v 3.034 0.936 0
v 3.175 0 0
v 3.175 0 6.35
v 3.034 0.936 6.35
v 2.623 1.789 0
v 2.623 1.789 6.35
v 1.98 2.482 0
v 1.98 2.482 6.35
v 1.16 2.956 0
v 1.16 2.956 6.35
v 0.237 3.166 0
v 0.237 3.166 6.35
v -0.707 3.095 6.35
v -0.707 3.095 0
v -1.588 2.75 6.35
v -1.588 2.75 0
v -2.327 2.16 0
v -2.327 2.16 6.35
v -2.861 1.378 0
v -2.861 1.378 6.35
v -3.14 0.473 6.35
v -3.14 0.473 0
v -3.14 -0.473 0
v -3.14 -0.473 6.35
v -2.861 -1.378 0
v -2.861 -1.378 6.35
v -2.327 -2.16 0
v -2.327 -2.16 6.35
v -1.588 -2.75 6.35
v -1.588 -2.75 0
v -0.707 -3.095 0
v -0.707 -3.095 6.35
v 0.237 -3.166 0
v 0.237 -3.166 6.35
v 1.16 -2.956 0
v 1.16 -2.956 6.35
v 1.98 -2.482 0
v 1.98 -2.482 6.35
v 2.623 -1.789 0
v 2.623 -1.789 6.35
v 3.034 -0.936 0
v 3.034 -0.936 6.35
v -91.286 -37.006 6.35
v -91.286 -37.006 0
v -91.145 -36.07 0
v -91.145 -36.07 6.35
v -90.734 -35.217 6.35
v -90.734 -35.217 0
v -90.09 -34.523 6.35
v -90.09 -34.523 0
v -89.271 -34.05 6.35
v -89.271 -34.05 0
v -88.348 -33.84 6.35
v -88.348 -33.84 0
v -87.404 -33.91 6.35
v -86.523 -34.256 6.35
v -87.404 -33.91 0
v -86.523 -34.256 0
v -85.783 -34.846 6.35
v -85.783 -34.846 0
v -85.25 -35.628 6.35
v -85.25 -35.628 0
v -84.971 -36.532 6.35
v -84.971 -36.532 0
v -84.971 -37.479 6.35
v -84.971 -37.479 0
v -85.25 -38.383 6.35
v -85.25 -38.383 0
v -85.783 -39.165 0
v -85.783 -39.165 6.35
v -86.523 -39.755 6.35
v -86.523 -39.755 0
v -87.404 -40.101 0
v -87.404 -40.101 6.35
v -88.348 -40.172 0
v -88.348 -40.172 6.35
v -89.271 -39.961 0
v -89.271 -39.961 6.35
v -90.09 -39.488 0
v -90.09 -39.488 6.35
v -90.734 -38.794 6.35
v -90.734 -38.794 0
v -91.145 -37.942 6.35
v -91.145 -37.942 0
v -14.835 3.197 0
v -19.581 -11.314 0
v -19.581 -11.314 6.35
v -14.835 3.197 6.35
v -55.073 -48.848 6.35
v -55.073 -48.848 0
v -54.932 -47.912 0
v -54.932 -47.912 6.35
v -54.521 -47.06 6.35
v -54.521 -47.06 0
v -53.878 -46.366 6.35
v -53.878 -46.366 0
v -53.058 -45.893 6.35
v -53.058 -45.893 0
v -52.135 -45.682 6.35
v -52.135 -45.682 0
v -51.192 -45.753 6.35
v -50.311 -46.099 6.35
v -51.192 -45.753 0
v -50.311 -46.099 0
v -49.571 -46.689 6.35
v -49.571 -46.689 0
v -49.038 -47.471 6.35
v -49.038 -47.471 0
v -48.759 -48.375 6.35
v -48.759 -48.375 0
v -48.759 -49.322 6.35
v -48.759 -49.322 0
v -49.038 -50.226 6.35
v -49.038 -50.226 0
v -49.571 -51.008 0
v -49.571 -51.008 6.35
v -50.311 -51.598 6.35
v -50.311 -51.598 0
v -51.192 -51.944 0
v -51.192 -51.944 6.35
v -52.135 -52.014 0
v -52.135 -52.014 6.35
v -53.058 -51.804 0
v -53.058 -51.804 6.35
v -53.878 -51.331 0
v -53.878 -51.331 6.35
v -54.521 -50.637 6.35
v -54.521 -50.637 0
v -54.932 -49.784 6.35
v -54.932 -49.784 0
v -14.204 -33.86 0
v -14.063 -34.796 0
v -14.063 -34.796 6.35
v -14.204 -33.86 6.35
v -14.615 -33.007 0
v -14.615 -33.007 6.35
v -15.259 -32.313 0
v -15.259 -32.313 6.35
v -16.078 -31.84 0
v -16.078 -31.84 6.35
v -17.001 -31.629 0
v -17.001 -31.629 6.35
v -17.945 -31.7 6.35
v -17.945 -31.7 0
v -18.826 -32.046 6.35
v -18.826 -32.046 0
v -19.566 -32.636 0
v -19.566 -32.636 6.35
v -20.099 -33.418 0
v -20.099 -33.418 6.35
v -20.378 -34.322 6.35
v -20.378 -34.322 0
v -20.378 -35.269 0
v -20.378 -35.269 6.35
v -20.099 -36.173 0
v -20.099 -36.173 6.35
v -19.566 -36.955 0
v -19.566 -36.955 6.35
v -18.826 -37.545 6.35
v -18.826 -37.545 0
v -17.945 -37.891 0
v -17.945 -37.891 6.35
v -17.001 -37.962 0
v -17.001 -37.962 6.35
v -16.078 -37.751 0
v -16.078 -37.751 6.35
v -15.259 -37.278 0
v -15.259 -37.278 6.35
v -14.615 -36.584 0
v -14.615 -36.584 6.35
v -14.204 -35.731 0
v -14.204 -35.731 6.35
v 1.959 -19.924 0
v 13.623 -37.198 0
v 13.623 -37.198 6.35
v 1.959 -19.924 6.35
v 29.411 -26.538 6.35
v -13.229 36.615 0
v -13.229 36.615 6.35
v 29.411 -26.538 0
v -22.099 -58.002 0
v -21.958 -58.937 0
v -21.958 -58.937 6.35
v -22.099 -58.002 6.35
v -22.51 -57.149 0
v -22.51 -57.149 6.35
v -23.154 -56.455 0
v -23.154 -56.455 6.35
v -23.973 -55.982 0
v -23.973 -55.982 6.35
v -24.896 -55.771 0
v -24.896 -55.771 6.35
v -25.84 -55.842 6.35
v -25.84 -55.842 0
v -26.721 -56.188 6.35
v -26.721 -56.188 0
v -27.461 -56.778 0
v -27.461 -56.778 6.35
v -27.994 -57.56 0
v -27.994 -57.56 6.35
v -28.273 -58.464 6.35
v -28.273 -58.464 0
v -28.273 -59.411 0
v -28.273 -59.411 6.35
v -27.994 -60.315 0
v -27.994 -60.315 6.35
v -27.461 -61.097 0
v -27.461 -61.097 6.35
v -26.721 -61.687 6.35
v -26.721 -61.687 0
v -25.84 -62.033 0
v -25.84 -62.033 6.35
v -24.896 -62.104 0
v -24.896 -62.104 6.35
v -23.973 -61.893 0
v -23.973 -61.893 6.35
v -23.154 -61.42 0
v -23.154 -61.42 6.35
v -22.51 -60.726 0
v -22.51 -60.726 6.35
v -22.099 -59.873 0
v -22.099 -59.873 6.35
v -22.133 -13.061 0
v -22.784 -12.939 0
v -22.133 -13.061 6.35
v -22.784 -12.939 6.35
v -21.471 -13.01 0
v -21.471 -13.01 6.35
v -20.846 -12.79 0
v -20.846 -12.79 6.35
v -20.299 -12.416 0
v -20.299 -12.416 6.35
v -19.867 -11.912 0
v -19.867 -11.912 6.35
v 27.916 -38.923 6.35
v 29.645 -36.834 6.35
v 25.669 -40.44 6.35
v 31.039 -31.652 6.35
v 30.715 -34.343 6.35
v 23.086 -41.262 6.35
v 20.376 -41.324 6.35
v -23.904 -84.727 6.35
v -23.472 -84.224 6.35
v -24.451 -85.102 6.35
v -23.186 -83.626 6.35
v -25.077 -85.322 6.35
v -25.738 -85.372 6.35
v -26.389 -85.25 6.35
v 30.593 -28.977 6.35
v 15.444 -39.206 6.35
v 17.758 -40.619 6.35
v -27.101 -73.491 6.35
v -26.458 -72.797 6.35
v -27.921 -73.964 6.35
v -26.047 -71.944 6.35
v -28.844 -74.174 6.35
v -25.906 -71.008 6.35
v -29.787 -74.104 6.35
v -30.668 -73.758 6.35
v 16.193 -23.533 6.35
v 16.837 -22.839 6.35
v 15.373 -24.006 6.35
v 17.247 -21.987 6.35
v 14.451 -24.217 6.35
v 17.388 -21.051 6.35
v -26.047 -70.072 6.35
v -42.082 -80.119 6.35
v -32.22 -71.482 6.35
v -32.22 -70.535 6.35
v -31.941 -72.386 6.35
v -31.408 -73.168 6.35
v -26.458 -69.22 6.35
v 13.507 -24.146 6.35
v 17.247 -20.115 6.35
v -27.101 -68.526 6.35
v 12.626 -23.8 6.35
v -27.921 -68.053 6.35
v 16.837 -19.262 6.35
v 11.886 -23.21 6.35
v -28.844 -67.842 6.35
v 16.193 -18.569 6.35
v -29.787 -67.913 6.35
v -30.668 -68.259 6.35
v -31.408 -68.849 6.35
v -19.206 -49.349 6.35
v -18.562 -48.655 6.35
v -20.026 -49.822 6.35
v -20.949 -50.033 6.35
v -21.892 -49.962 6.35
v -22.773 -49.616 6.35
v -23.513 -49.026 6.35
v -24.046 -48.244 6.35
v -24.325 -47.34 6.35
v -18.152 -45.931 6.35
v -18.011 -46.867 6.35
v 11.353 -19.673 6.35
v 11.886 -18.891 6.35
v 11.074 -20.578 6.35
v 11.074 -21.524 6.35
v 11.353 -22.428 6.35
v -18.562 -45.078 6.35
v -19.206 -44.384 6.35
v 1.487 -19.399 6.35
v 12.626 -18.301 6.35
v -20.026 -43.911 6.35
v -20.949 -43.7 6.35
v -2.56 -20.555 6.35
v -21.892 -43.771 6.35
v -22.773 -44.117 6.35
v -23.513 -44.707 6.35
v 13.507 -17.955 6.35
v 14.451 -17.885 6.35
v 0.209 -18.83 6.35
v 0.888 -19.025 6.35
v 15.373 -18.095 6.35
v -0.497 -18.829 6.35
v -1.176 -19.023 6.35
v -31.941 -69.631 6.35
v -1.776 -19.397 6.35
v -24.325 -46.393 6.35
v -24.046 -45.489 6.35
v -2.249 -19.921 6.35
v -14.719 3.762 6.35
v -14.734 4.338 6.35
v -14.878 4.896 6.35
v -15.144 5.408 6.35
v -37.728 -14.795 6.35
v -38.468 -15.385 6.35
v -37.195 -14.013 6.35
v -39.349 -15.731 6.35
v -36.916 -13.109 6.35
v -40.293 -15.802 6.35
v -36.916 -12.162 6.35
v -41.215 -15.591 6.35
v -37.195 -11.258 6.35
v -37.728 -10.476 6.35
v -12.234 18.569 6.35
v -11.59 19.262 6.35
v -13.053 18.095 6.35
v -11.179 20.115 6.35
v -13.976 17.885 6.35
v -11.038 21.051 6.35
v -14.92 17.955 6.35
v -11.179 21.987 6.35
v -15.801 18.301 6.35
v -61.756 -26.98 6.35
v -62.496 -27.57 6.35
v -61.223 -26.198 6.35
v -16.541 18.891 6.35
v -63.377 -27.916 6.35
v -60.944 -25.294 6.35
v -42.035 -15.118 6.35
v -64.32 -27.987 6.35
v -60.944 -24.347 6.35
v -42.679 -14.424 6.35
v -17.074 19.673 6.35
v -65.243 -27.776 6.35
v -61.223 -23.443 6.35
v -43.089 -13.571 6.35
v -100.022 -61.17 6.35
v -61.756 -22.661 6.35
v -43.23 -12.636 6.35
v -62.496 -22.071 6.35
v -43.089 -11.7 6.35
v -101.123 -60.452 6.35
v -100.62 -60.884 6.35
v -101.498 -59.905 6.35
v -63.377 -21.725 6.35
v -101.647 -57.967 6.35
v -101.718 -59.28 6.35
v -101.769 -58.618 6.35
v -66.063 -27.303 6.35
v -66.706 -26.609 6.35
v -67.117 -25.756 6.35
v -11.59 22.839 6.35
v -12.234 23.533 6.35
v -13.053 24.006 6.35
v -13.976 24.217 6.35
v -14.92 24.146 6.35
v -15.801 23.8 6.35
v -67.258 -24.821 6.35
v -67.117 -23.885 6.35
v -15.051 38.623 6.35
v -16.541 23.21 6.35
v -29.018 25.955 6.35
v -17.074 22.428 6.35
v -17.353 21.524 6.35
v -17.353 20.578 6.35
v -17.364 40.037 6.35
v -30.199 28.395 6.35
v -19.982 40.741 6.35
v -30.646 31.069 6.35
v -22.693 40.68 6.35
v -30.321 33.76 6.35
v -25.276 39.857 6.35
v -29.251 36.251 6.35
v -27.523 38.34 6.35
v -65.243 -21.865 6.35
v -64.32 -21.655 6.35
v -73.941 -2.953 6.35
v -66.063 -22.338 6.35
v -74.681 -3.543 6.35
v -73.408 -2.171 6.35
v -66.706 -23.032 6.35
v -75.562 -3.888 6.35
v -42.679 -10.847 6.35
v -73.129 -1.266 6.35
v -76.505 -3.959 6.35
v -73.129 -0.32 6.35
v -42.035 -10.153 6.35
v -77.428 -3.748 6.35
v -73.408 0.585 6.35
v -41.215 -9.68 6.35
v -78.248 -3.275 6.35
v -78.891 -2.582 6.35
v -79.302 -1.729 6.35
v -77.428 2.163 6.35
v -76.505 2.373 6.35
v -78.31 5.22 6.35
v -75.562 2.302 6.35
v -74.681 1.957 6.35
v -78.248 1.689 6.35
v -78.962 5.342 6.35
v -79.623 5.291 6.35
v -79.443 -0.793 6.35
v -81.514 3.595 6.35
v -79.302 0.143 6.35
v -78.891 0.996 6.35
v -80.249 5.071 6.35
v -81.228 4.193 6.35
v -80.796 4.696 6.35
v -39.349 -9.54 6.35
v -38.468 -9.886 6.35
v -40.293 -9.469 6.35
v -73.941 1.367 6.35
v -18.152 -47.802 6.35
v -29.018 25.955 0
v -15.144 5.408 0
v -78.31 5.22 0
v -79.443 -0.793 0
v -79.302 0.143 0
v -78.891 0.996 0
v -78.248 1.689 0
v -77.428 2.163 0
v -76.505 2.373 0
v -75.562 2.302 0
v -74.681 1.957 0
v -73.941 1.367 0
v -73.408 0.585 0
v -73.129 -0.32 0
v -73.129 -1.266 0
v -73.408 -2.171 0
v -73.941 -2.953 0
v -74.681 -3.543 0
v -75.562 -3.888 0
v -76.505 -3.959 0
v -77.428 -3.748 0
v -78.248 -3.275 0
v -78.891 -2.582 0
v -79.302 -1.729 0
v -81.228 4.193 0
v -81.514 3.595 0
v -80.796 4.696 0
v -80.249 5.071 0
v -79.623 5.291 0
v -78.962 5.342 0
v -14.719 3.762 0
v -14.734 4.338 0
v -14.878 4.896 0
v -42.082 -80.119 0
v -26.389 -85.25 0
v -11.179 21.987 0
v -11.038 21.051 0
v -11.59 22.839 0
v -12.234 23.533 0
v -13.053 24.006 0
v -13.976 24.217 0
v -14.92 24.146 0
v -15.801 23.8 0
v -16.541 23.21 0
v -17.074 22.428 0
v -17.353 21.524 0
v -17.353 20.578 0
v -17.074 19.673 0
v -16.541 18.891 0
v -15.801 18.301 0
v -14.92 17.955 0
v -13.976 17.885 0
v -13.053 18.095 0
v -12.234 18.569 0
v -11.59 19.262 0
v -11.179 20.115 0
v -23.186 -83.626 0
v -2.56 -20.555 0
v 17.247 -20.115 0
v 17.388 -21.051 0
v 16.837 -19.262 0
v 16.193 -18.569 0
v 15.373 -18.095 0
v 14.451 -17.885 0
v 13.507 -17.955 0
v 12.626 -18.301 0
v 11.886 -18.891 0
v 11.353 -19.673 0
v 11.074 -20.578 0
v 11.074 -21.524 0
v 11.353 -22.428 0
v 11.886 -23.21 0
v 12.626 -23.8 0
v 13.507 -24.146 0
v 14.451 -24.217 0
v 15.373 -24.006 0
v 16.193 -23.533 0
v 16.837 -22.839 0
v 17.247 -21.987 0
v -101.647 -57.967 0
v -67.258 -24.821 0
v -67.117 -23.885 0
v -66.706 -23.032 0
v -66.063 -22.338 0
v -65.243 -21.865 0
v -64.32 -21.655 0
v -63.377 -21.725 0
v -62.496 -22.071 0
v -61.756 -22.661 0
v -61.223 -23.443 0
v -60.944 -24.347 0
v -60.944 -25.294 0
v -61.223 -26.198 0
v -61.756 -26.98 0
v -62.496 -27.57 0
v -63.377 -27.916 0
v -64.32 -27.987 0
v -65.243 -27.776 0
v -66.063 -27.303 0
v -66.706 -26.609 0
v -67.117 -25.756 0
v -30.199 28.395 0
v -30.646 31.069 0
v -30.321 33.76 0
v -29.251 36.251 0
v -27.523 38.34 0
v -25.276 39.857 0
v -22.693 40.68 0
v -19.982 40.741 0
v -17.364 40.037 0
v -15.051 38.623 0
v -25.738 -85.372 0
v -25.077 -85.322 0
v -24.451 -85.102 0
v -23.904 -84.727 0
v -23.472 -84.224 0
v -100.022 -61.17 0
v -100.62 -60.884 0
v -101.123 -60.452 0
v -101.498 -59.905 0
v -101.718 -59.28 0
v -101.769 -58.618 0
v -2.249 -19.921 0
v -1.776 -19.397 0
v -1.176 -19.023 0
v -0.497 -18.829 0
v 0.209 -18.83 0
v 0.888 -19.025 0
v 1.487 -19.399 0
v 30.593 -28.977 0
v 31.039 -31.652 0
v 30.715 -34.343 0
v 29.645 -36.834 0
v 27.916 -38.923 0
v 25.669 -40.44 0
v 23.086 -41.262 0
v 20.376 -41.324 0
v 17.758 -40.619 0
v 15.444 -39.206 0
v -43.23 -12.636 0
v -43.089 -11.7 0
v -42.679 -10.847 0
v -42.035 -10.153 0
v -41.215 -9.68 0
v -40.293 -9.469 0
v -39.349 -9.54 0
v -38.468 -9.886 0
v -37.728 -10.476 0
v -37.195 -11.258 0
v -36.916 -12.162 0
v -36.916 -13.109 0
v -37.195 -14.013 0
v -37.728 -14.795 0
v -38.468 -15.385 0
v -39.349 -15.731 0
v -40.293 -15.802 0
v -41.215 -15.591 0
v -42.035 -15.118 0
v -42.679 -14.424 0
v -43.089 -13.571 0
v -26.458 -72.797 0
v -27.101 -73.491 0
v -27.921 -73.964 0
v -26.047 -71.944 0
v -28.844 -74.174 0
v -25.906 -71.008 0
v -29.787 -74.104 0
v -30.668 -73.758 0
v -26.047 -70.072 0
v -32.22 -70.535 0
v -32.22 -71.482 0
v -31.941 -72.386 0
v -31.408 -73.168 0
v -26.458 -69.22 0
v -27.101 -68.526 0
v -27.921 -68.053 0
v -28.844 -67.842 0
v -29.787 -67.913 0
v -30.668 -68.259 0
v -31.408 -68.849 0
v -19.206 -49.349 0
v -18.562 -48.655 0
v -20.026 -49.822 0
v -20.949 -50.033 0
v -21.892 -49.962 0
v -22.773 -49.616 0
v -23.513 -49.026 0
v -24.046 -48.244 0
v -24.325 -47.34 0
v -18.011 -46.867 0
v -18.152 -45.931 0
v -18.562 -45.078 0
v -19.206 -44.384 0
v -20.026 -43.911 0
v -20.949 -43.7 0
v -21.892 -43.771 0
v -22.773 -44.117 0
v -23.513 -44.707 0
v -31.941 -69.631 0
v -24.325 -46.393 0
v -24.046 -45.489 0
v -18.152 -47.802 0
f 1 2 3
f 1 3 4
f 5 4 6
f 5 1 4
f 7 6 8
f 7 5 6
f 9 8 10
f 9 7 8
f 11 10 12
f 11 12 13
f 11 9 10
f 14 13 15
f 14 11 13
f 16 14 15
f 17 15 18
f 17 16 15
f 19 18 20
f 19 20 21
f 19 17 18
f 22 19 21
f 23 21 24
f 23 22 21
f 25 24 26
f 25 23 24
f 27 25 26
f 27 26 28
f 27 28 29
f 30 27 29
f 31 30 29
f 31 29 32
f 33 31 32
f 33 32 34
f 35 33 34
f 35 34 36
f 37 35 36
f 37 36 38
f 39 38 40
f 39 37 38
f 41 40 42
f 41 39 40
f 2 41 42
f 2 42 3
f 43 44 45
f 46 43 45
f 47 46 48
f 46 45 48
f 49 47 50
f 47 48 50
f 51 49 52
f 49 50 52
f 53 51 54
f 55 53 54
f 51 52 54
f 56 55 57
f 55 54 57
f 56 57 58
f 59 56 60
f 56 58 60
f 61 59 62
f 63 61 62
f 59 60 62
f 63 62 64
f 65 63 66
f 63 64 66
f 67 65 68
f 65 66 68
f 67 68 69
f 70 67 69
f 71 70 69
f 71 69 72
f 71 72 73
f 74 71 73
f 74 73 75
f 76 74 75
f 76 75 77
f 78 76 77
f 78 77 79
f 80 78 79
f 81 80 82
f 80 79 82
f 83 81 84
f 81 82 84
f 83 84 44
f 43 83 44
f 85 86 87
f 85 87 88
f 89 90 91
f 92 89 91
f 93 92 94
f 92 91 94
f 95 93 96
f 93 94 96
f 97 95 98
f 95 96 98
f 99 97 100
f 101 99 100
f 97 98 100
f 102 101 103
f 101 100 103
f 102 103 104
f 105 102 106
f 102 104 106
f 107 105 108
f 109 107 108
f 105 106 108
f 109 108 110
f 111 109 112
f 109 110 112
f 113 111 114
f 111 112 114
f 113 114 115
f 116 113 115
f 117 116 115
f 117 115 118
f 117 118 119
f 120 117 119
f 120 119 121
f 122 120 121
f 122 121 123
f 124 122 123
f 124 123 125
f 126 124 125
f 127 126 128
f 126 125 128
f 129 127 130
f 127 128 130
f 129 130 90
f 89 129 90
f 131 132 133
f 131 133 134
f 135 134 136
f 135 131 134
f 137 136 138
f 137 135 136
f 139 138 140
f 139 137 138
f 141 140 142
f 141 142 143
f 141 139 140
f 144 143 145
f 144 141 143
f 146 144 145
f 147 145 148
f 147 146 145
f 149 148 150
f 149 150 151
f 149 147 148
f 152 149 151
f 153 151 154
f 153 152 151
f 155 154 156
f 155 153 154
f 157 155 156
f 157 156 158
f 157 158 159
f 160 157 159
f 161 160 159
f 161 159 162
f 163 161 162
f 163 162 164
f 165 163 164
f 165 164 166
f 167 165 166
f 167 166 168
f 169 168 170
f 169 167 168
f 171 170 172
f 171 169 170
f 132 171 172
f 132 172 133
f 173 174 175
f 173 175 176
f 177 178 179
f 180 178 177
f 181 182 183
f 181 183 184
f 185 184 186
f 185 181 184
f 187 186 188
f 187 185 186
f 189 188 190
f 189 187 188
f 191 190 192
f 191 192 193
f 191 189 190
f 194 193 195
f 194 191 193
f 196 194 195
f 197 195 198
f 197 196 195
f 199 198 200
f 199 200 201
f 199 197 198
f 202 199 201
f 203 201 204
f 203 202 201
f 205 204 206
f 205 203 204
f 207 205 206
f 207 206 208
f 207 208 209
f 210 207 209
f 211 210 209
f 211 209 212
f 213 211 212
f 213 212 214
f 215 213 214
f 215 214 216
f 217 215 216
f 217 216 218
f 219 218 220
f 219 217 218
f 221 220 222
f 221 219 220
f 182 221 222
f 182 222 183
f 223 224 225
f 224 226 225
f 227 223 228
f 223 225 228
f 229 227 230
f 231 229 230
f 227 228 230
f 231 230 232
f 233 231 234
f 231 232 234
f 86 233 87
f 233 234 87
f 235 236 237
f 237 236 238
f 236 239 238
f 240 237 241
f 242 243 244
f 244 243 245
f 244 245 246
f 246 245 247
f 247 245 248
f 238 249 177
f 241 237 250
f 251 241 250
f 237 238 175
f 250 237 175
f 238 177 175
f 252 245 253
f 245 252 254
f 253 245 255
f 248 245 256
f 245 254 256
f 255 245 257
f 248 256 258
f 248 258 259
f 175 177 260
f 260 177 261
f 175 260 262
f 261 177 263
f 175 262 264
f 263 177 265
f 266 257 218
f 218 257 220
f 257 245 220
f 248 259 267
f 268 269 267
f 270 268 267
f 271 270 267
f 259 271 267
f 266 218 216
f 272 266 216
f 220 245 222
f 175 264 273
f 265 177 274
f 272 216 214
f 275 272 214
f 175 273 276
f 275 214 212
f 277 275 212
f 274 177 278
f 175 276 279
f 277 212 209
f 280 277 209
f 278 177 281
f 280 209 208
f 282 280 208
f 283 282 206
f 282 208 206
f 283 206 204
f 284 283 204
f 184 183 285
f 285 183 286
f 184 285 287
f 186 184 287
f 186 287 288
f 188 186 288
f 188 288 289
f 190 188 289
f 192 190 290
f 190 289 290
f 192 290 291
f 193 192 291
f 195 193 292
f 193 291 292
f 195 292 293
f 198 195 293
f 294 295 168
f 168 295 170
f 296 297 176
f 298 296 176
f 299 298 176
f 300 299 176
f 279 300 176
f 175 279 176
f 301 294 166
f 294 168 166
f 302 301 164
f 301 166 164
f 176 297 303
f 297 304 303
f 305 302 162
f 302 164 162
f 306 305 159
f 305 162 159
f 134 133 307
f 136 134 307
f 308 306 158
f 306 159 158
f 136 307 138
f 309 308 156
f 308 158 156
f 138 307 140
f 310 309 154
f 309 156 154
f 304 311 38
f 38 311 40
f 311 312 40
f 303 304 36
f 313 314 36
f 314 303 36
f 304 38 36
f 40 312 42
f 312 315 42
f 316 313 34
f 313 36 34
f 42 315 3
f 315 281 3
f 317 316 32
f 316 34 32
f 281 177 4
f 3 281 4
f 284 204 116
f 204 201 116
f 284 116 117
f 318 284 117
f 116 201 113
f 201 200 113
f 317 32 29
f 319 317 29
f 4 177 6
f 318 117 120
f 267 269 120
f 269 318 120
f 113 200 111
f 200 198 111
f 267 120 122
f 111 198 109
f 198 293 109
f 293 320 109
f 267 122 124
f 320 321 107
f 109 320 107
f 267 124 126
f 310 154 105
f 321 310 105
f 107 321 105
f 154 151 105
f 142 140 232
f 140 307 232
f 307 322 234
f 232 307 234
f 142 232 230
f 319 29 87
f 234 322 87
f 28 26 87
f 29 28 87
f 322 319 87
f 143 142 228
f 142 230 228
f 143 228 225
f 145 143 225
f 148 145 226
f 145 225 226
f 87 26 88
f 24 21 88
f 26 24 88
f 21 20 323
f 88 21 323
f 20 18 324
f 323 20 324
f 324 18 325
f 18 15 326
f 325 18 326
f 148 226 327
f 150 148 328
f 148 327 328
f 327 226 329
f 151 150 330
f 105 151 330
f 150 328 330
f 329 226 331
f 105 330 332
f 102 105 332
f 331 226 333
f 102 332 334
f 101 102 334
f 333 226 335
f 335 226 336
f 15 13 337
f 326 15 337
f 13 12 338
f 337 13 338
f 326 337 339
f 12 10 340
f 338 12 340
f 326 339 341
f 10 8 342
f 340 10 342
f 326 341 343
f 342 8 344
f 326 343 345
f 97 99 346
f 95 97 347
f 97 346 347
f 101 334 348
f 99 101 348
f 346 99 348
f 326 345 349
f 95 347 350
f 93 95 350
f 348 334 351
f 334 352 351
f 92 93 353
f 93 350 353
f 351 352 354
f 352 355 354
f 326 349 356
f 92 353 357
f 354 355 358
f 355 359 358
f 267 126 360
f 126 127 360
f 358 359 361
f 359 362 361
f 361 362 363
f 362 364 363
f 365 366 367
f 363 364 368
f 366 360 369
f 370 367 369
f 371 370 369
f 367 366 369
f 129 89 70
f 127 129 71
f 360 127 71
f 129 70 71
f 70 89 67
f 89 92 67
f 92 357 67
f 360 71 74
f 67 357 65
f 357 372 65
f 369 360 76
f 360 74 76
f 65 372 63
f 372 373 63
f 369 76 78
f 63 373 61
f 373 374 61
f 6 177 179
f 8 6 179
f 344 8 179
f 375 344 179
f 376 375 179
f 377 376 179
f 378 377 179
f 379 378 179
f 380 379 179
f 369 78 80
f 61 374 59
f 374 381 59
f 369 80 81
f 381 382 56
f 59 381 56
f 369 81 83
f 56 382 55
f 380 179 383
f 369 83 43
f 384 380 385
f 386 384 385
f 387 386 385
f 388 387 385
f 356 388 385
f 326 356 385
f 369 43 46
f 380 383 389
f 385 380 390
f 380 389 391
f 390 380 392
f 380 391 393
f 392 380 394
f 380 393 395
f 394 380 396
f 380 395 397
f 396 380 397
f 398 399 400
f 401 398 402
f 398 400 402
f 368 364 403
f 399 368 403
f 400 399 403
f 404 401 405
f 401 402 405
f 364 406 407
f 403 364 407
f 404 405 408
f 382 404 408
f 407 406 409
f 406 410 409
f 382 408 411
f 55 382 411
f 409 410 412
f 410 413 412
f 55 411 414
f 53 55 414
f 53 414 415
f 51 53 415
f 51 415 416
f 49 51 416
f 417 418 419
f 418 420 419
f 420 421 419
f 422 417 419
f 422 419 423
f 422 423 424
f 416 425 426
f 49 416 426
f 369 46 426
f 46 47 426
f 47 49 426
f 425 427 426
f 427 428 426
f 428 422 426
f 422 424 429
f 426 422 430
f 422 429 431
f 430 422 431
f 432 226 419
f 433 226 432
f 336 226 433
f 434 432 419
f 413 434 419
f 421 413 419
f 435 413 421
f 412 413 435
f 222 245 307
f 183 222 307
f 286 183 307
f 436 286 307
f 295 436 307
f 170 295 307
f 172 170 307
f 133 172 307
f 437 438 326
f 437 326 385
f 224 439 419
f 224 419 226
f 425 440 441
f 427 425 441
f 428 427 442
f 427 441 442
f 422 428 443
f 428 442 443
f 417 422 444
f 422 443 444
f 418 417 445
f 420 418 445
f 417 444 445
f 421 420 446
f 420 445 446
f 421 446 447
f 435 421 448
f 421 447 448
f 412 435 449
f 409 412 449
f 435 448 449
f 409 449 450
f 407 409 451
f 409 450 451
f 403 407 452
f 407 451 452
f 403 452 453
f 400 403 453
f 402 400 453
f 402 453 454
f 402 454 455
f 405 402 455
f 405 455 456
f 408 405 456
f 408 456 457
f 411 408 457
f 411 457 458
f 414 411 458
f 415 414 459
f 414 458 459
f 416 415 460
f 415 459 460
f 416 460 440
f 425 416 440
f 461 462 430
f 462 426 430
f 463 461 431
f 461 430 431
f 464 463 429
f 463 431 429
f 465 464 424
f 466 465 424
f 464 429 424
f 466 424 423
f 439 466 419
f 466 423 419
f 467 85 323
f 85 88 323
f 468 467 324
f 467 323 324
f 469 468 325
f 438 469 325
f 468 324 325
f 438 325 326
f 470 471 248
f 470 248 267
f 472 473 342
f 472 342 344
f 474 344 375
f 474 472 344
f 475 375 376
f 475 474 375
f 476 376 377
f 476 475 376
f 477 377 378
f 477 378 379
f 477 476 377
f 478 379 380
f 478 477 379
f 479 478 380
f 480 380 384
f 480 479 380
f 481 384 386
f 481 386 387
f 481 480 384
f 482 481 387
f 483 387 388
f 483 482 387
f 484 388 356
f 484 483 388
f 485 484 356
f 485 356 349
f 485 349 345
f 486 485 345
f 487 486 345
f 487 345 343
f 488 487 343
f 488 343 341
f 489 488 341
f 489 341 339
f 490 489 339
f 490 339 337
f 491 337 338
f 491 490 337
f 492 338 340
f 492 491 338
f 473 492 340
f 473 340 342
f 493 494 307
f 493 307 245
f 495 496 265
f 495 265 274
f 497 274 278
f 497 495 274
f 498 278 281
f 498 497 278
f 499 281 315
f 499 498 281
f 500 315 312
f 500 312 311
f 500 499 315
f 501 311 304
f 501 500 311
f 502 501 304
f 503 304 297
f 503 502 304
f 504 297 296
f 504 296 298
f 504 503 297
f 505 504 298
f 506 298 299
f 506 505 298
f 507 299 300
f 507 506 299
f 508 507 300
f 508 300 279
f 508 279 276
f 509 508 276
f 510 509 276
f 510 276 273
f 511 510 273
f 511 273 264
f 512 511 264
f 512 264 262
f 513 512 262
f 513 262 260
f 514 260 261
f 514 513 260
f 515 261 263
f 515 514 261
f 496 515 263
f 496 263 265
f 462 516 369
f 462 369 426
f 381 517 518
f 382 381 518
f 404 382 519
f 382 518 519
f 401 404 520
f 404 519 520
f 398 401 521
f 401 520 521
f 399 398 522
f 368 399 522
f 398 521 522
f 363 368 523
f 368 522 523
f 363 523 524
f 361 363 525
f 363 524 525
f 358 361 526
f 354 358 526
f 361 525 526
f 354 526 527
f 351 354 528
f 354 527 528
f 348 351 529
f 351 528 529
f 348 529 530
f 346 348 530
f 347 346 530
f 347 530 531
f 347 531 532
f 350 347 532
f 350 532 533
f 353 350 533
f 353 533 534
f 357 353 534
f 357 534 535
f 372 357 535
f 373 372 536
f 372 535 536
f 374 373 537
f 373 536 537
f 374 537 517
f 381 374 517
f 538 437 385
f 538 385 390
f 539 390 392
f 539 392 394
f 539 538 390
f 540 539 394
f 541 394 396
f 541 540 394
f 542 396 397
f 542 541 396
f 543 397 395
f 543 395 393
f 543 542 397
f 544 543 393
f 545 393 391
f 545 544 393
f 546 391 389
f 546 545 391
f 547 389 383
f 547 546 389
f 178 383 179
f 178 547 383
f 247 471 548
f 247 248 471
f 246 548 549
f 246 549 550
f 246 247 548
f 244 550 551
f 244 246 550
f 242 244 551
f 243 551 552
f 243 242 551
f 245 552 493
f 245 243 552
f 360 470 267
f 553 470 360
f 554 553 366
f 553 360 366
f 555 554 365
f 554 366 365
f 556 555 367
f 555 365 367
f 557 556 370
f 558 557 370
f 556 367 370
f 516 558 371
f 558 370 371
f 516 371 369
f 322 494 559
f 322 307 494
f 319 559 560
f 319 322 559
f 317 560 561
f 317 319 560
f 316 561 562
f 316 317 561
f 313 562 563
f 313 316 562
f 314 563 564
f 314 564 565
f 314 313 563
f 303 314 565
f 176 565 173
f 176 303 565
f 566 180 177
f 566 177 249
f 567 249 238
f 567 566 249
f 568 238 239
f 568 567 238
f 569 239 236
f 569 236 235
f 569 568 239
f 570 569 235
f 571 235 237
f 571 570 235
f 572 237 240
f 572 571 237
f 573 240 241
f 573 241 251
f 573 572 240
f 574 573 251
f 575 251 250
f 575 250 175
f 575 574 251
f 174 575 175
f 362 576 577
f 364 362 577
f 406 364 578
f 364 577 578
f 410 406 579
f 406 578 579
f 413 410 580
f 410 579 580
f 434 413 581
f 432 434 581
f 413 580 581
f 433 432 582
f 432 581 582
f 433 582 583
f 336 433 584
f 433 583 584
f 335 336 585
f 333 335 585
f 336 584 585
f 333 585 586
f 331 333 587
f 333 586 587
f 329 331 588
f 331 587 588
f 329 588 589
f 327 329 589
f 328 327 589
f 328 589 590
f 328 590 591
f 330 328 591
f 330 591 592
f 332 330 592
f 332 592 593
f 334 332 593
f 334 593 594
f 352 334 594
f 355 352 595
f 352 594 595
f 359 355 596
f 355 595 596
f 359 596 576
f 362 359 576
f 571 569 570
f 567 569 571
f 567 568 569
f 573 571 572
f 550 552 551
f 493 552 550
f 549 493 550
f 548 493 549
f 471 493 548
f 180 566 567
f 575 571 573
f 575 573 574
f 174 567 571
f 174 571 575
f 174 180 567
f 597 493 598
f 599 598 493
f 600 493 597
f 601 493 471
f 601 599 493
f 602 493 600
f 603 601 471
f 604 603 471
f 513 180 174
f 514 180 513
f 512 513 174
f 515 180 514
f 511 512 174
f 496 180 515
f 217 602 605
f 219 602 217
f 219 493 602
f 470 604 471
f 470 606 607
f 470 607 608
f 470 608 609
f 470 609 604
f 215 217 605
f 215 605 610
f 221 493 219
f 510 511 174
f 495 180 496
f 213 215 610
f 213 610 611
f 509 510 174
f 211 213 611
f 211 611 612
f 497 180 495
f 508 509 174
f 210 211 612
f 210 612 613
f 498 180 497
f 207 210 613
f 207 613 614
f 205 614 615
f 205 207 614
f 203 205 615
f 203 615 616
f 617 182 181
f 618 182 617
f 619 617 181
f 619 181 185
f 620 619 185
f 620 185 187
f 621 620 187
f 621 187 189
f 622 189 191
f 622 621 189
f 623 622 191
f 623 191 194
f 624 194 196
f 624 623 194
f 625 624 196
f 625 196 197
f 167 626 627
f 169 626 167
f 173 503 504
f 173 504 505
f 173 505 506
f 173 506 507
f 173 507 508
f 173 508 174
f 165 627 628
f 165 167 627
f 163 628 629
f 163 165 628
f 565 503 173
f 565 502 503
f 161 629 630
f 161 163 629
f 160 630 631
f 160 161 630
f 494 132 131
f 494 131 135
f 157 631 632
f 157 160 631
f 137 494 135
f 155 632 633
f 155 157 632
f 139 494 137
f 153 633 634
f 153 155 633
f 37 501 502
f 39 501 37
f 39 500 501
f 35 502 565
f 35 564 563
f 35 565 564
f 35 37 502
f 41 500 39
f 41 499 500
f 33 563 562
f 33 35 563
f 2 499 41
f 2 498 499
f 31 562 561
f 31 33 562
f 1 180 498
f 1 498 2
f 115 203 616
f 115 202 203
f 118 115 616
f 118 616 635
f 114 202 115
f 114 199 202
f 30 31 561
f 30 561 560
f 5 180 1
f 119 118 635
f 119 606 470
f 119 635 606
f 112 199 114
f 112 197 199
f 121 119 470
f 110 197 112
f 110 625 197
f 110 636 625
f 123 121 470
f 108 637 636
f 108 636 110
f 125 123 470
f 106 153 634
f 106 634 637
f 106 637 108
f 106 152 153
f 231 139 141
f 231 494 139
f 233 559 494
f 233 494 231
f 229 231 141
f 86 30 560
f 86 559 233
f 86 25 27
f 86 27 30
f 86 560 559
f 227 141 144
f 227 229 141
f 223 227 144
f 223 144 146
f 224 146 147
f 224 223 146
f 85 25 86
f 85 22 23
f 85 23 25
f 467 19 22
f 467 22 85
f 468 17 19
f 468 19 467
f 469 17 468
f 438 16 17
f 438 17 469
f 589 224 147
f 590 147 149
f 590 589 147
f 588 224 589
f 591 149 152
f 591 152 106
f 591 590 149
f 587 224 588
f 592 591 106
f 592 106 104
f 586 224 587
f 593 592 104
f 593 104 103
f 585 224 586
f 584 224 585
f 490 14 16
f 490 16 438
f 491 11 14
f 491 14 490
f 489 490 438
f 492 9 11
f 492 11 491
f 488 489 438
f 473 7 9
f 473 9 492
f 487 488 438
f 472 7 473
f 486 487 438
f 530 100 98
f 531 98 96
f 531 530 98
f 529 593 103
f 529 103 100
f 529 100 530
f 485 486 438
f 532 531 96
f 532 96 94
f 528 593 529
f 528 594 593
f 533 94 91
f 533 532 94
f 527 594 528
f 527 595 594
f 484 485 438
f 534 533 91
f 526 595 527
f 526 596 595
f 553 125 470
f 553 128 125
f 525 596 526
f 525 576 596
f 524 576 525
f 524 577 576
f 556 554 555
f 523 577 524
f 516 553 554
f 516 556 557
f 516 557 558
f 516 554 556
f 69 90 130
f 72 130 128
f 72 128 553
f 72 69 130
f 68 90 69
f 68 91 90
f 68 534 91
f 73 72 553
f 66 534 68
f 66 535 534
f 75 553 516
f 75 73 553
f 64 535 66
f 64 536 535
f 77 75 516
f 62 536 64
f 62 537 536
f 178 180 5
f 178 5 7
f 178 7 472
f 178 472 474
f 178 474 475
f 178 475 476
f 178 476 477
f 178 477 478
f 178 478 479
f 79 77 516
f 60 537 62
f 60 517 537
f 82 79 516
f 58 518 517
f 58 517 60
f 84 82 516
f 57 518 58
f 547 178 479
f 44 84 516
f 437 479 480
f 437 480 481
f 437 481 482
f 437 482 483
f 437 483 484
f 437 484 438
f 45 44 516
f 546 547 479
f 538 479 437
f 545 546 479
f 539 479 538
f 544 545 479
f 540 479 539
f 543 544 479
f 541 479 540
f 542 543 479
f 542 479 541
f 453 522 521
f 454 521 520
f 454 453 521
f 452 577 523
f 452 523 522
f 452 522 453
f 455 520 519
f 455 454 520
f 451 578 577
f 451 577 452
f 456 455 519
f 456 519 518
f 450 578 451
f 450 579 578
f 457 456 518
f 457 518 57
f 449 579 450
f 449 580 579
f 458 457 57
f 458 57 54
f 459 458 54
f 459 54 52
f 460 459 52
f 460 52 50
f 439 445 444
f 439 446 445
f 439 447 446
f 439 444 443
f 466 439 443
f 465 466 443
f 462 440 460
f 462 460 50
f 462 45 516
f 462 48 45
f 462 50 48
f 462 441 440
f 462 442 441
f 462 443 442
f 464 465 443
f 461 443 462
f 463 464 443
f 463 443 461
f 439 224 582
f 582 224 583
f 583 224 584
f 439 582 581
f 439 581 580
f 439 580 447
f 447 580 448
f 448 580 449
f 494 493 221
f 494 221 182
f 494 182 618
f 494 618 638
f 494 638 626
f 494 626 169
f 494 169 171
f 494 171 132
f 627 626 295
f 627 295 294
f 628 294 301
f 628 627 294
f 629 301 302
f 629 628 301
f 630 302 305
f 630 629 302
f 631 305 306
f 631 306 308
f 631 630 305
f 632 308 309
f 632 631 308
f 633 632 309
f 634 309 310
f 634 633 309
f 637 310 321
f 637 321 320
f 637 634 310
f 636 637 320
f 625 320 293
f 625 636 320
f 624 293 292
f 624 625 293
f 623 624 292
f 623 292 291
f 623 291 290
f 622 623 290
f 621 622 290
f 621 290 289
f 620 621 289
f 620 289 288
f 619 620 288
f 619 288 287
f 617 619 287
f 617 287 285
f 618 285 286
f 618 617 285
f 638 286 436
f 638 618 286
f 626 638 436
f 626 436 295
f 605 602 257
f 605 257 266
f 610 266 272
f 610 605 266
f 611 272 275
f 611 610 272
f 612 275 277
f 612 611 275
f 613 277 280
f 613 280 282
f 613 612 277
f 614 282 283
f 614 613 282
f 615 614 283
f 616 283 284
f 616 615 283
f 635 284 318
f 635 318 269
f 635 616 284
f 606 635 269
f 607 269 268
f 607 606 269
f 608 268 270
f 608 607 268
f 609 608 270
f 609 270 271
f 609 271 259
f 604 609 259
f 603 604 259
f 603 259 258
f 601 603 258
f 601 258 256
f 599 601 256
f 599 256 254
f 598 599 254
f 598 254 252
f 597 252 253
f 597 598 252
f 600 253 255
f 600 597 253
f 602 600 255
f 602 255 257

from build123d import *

# Parameters (mm, degrees)
SKETCH1_R           = 3.175
BOSS_EXTRUDE2_DEPTH = 6.35
BOSS_EXTRUDE3_DEPTH = 6.35
SKETCH3_R           = 3.175
CUT_EXTRUDE1_DEPTH  = 6.35
FILLET1_R           = 2.54


with BuildPart() as part:
    # Sketch1 → Boss-Extrude2 (new body)
    with BuildSketch(Plane.XY):
        with BuildLine():
            Line((-13.229381943, 36.614978912), (29.410930021, -26.537564946))
            ThreePointArc((29.410930021, -26.537564946), (26.846901034, -39.761671923), (13.622794056, -37.197642936))
            Line((13.622794056, -37.197642936), (-0.945979198, -15.620523785))
            Line((-0.945979198, -15.620523785), (-23.975246761, -86.039905978))
            Line((-23.975246761, -86.039905978), (-42.081609524, -80.118577791))
            Line((-42.081609524, -80.118577791), (-14.448744653, 4.37778177))
            Line((-14.448744653, 4.37778177), (-29.017517907, 25.954900921))
            ThreePointArc((-29.017517907, 25.954900921), (-26.45348892, 39.179007899), (-13.229381943, 36.614978912))
        make_face()
        with Locations((-14.213437321, 21.050847952)):
            Circle(SKETCH1_R, mode=Mode.SUBTRACT)
        with Locations((14.213437321, -21.050847952)):
            Circle(SKETCH1_R, mode=Mode.SUBTRACT)
        Circle(SKETCH1_R, mode=Mode.SUBTRACT)
        with Locations((-29.080876018, -71.008333376)):
            Circle(SKETCH1_R, mode=Mode.SUBTRACT)
        with Locations((-25.133323893, -58.937424867)):
            Circle(SKETCH1_R, mode=Mode.SUBTRACT)
        with Locations((-21.185771769, -46.866516358)):
            Circle(SKETCH1_R, mode=Mode.SUBTRACT)
        with Locations((-17.238219645, -34.79560785)):
            Circle(SKETCH1_R, mode=Mode.SUBTRACT)
    extrude(amount=BOSS_EXTRUDE2_DEPTH)

    # Sketch2 → Boss-Extrude3 (add)
    with BuildSketch(Plane(origin=(0, 0, 0), x_dir=(-1, 0, 0), z_dir=(0, 0, -1))):
        Polygon((20.370072839, -13.728580993), (42.081609524, -80.118577791), (102.436152067, -60.380817169), (80.724615383, 6.009179629), align=None)
    extrude(amount=-BOSS_EXTRUDE3_DEPTH)

    # Sketch3 → Cut-Extrude1 (cut)
    with BuildSketch(Plane(origin=(0, 0, 0), x_dir=(-1, 0, 0), z_dir=(0, 0, -1))):
        with Locations((76.268181978, -0.792959837)):
            Circle(SKETCH3_R)
        with Locations((40.055456452, -12.63561621)):
            Circle(SKETCH3_R)
        with Locations((51.898112825, -48.848341736)):
            Circle(SKETCH3_R)
        with Locations((88.110838352, -37.005685363)):
            Circle(SKETCH3_R)
        with Locations((64.083147402, -24.820650786)):
            Circle(SKETCH3_R)
    extrude(amount=-CUT_EXTRUDE1_DEPTH, mode=Mode.SUBTRACT)

    # Fillet1
    fillet1_edges = [part.edges().sort_by_distance(p)[0] for p in [
        (-0.945979198, -15.620523785, 3.175),
        (-23.975246761, -86.039905978, 3.175),
        (-14.448744653, 4.37778177, 3.175),
        (-20.370072839, -13.728580993, 3.175),
        (-80.724615383, 6.009179629, 3.175),
        (-102.436152067, -60.380817169, 3.175),
    ]]
    fillet(fillet1_edges, radius=FILLET1_R)


solid = part.part
